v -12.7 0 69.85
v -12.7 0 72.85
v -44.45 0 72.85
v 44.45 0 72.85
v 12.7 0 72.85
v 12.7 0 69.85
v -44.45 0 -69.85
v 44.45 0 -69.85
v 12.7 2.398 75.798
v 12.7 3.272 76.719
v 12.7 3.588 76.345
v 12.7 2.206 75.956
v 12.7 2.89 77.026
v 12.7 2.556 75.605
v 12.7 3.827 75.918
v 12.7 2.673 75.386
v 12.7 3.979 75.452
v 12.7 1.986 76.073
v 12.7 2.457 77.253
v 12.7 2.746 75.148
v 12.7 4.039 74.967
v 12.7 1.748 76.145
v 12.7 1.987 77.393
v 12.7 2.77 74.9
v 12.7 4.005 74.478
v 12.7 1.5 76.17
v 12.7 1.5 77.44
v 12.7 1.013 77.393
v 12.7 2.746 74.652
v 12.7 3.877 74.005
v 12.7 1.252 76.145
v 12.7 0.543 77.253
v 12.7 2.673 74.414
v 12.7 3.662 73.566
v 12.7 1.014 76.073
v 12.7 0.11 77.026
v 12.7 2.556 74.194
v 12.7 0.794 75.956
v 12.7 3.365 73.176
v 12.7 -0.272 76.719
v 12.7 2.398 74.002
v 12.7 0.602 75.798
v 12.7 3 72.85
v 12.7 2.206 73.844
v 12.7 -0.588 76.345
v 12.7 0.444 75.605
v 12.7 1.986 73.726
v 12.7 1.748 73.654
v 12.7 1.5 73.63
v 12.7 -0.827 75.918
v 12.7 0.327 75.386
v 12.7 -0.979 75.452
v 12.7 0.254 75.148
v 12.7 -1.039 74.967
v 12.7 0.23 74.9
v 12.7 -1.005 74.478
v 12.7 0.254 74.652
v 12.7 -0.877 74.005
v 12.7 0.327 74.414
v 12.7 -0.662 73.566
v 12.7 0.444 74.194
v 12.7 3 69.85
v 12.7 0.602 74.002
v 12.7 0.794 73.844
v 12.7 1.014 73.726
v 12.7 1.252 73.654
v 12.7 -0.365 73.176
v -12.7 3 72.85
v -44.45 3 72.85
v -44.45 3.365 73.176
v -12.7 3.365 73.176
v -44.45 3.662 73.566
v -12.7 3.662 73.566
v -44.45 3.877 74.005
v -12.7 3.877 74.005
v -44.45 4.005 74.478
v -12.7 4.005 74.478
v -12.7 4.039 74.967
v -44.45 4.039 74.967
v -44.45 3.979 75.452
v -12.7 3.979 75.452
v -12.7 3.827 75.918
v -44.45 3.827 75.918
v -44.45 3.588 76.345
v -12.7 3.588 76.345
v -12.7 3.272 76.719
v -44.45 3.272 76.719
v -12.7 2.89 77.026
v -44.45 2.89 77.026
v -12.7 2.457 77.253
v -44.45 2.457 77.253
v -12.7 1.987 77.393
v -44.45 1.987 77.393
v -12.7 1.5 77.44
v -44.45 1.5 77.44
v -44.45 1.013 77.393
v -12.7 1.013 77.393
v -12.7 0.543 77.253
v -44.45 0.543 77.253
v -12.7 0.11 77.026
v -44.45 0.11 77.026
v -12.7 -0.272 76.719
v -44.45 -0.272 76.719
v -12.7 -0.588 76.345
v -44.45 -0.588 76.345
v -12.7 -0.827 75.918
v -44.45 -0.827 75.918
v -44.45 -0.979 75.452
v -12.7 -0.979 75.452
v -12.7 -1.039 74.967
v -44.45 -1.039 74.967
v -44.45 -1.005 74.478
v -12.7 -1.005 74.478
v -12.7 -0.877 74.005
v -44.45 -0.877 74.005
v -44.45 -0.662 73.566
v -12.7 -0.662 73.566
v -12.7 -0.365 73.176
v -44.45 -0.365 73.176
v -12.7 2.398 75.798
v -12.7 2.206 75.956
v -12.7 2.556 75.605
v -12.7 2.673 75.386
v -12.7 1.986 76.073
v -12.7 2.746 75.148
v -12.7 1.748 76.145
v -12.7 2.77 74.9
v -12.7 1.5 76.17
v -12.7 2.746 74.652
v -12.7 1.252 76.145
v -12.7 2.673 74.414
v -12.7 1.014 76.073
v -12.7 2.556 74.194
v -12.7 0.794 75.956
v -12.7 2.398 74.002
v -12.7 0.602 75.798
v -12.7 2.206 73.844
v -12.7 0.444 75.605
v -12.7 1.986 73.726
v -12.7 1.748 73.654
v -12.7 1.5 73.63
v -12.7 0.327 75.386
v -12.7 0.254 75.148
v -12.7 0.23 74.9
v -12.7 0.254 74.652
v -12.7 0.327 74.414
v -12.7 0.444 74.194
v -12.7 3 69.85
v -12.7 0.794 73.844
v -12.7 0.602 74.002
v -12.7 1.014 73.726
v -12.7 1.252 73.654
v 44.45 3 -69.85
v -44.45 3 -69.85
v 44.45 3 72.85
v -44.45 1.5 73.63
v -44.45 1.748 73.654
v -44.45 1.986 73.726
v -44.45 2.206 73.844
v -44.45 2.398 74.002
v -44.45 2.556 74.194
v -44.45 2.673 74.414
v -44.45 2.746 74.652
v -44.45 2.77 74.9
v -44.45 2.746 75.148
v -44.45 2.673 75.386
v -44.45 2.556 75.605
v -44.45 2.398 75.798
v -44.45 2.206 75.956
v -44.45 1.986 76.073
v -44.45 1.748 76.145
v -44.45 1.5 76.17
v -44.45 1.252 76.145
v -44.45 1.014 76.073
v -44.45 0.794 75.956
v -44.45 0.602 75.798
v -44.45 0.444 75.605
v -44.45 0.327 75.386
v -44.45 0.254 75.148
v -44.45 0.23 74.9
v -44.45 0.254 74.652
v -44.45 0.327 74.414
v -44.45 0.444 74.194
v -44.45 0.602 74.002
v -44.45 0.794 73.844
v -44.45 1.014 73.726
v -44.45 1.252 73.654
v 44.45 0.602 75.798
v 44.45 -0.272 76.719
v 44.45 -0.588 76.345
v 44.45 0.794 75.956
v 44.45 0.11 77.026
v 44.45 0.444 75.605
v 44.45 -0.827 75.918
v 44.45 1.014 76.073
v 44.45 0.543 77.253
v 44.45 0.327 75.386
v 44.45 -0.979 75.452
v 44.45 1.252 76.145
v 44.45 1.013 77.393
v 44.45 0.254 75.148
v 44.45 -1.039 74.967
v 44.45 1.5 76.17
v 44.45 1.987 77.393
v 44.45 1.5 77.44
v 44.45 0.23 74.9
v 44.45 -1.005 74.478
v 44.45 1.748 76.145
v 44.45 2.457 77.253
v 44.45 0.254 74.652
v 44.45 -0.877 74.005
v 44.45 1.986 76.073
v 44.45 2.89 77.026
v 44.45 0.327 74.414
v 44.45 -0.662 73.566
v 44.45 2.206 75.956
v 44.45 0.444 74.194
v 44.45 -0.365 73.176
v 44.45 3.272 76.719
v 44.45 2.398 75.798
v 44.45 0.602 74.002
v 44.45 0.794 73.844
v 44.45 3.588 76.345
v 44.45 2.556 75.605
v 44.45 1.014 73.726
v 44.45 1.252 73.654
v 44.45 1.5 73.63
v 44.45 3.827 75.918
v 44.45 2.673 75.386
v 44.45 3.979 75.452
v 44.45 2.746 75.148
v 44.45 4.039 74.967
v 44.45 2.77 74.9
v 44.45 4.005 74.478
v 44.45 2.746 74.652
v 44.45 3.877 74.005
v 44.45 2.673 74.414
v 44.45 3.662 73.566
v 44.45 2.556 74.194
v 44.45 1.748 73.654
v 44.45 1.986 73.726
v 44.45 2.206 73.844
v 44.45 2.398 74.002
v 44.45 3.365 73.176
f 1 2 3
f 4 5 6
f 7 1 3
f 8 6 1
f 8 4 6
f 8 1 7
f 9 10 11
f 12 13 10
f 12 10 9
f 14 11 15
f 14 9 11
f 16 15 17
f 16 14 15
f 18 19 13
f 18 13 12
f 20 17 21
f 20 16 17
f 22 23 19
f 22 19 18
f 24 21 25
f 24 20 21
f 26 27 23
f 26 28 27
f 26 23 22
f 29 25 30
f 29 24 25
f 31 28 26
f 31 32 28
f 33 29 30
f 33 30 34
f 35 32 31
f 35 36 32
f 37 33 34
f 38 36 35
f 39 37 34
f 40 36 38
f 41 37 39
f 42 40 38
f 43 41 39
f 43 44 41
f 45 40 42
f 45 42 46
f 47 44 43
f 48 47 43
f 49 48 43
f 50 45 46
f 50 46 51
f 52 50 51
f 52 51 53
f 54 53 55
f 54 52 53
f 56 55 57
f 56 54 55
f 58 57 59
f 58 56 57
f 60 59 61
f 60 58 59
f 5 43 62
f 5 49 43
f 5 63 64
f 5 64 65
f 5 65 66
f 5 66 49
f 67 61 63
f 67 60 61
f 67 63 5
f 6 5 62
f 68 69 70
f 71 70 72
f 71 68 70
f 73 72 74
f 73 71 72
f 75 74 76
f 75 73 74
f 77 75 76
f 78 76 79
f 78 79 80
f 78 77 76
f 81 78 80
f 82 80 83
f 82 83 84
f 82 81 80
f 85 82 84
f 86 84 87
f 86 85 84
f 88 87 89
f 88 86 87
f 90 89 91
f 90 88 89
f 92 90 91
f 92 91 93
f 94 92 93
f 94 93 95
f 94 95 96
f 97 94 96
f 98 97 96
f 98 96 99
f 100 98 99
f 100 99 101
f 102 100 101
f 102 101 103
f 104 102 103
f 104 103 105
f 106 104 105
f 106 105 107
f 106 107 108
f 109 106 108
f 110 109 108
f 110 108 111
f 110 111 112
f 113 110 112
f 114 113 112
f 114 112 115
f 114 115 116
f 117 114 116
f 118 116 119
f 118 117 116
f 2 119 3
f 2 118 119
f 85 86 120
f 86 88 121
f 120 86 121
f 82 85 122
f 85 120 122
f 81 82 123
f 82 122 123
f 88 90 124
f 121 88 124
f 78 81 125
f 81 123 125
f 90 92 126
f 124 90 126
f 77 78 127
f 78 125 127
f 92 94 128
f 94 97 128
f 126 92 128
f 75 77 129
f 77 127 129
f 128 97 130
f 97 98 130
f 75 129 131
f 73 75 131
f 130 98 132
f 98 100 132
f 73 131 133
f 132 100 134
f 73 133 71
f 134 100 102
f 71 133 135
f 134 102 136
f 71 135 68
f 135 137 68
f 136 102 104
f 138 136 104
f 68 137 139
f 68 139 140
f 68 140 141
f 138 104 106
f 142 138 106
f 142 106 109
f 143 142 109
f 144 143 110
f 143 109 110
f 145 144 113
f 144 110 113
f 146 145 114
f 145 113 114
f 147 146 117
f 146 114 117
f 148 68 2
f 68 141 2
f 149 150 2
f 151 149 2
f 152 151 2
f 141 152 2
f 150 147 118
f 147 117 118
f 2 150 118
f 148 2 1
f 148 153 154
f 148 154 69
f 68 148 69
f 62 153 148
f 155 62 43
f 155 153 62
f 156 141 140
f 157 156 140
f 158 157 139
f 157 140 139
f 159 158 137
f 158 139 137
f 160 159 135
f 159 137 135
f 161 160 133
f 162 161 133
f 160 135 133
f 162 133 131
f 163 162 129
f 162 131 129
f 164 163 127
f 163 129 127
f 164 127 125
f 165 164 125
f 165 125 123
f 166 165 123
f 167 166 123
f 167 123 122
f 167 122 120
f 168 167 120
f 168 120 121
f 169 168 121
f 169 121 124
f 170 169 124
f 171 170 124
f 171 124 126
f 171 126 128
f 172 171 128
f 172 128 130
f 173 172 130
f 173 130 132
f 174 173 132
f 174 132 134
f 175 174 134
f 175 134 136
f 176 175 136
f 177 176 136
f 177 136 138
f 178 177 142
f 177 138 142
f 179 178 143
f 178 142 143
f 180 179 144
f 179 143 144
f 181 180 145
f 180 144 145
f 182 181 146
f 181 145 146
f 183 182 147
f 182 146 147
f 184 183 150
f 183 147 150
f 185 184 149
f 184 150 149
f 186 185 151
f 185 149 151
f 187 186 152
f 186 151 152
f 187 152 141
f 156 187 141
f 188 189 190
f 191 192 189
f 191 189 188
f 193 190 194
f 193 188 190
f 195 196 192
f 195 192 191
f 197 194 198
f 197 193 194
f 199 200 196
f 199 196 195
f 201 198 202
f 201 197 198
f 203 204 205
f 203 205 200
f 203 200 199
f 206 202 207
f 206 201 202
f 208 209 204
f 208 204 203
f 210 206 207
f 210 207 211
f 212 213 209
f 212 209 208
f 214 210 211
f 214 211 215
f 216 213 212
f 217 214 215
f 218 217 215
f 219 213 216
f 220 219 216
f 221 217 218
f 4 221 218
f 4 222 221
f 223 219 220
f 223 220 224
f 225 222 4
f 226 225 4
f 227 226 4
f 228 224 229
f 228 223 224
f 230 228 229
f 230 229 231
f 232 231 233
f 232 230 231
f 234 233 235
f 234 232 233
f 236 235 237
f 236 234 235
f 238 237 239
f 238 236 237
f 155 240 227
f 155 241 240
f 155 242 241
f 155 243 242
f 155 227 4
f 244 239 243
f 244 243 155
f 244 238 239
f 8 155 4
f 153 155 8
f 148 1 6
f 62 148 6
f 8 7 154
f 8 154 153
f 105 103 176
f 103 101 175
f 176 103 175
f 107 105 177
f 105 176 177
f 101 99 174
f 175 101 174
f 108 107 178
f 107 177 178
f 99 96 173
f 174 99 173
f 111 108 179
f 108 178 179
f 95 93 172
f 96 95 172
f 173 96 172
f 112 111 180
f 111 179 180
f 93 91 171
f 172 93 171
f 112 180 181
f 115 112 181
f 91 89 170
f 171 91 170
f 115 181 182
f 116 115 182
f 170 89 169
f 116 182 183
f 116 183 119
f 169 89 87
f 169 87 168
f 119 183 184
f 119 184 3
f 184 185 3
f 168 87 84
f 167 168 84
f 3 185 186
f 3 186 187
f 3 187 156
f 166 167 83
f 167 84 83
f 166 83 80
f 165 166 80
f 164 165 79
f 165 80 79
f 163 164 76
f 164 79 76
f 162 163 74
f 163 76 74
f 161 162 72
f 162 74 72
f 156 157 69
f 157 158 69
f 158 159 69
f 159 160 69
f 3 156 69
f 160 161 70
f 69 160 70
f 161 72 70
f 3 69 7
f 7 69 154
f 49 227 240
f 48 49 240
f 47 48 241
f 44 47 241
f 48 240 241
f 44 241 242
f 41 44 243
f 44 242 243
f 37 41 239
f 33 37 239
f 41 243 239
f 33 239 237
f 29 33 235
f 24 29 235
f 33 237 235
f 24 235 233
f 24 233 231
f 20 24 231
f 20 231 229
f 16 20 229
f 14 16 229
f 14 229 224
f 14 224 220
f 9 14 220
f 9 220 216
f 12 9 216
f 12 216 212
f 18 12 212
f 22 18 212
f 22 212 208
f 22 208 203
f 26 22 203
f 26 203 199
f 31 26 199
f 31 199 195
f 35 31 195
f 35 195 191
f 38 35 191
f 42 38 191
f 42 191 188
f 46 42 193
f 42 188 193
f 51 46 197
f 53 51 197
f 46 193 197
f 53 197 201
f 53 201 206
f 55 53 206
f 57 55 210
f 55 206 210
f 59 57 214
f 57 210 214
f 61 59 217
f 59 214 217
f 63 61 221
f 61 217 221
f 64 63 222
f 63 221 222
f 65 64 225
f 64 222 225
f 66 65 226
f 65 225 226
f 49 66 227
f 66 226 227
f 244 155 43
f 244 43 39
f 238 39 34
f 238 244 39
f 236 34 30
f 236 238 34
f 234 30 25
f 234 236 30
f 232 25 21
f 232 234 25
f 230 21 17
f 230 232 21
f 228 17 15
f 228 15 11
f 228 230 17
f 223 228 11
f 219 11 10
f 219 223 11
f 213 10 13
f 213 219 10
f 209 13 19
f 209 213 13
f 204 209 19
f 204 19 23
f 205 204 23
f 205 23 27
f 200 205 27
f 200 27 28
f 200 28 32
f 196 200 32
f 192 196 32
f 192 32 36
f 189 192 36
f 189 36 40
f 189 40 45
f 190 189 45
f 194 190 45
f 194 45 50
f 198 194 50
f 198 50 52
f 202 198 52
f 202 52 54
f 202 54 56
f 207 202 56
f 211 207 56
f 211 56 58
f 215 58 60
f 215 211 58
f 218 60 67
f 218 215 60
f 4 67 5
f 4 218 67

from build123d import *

# Parameters (mm, degrees)
SKETCH1_W               = 88.9
SKETCH1_H               = 139.7
BOSS_EXTRUDE1_DEPTH     = 3
SKETCH3_R               = 1.27
BOSS_EXTRUDE2_DEPTH     = 88.9
CUT_EXTRUDE1_DEPTH      = 90.381450537
CUT_EXTRUDE1_DEPTH_BACK = 90.381450537
SKETCH4_W               = 25.4
SKETCH4_H               = 17.737449085


with BuildPart() as part:
    # Sketch1 → Boss-Extrude1 (new body)
    with BuildSketch(Plane(origin=(0, 0, 0), x_dir=(1, 0, 0), z_dir=(0, 1, 0))):
        Rectangle(SKETCH1_W, SKETCH1_H)
    extrude(amount=BOSS_EXTRUDE1_DEPTH)

    # Sketch3 → Boss-Extrude2 (add)
    with BuildSketch(Plane(origin=(44.45, 0, 0), x_dir=(0, 0, -1), z_dir=(1, 0, 0))):
        with BuildLine():
            Line((-69.85, 0), (-69.85, 3))
            Line((-69.85, 3), (-72.85, 3))
            ThreePointArc((-72.85, 3), (-77.439780476, 1.5), (-72.85, 0))
            Line((-72.85, 0), (-69.85, 0))
        make_face()
        with Locations((-74.899780476, 1.5)):
            Circle(SKETCH3_R, mode=Mode.SUBTRACT)
    extrude(amount=-BOSS_EXTRUDE2_DEPTH)

    # Sketch4 → Cut-Extrude1 (cut, two sides: drawn at the far end of the back side and taken through both)
    with BuildSketch(Plane(origin=(0, 0, 0), x_dir=(1, 0, 0), z_dir=(0, 1, 0)).offset(-CUT_EXTRUDE1_DEPTH_BACK)):
        with Locations((0, -78.718724543)):
            Rectangle(SKETCH4_W, SKETCH4_H)
    extrude(amount=CUT_EXTRUDE1_DEPTH + CUT_EXTRUDE1_DEPTH_BACK, mode=Mode.SUBTRACT)


solid = part.part
